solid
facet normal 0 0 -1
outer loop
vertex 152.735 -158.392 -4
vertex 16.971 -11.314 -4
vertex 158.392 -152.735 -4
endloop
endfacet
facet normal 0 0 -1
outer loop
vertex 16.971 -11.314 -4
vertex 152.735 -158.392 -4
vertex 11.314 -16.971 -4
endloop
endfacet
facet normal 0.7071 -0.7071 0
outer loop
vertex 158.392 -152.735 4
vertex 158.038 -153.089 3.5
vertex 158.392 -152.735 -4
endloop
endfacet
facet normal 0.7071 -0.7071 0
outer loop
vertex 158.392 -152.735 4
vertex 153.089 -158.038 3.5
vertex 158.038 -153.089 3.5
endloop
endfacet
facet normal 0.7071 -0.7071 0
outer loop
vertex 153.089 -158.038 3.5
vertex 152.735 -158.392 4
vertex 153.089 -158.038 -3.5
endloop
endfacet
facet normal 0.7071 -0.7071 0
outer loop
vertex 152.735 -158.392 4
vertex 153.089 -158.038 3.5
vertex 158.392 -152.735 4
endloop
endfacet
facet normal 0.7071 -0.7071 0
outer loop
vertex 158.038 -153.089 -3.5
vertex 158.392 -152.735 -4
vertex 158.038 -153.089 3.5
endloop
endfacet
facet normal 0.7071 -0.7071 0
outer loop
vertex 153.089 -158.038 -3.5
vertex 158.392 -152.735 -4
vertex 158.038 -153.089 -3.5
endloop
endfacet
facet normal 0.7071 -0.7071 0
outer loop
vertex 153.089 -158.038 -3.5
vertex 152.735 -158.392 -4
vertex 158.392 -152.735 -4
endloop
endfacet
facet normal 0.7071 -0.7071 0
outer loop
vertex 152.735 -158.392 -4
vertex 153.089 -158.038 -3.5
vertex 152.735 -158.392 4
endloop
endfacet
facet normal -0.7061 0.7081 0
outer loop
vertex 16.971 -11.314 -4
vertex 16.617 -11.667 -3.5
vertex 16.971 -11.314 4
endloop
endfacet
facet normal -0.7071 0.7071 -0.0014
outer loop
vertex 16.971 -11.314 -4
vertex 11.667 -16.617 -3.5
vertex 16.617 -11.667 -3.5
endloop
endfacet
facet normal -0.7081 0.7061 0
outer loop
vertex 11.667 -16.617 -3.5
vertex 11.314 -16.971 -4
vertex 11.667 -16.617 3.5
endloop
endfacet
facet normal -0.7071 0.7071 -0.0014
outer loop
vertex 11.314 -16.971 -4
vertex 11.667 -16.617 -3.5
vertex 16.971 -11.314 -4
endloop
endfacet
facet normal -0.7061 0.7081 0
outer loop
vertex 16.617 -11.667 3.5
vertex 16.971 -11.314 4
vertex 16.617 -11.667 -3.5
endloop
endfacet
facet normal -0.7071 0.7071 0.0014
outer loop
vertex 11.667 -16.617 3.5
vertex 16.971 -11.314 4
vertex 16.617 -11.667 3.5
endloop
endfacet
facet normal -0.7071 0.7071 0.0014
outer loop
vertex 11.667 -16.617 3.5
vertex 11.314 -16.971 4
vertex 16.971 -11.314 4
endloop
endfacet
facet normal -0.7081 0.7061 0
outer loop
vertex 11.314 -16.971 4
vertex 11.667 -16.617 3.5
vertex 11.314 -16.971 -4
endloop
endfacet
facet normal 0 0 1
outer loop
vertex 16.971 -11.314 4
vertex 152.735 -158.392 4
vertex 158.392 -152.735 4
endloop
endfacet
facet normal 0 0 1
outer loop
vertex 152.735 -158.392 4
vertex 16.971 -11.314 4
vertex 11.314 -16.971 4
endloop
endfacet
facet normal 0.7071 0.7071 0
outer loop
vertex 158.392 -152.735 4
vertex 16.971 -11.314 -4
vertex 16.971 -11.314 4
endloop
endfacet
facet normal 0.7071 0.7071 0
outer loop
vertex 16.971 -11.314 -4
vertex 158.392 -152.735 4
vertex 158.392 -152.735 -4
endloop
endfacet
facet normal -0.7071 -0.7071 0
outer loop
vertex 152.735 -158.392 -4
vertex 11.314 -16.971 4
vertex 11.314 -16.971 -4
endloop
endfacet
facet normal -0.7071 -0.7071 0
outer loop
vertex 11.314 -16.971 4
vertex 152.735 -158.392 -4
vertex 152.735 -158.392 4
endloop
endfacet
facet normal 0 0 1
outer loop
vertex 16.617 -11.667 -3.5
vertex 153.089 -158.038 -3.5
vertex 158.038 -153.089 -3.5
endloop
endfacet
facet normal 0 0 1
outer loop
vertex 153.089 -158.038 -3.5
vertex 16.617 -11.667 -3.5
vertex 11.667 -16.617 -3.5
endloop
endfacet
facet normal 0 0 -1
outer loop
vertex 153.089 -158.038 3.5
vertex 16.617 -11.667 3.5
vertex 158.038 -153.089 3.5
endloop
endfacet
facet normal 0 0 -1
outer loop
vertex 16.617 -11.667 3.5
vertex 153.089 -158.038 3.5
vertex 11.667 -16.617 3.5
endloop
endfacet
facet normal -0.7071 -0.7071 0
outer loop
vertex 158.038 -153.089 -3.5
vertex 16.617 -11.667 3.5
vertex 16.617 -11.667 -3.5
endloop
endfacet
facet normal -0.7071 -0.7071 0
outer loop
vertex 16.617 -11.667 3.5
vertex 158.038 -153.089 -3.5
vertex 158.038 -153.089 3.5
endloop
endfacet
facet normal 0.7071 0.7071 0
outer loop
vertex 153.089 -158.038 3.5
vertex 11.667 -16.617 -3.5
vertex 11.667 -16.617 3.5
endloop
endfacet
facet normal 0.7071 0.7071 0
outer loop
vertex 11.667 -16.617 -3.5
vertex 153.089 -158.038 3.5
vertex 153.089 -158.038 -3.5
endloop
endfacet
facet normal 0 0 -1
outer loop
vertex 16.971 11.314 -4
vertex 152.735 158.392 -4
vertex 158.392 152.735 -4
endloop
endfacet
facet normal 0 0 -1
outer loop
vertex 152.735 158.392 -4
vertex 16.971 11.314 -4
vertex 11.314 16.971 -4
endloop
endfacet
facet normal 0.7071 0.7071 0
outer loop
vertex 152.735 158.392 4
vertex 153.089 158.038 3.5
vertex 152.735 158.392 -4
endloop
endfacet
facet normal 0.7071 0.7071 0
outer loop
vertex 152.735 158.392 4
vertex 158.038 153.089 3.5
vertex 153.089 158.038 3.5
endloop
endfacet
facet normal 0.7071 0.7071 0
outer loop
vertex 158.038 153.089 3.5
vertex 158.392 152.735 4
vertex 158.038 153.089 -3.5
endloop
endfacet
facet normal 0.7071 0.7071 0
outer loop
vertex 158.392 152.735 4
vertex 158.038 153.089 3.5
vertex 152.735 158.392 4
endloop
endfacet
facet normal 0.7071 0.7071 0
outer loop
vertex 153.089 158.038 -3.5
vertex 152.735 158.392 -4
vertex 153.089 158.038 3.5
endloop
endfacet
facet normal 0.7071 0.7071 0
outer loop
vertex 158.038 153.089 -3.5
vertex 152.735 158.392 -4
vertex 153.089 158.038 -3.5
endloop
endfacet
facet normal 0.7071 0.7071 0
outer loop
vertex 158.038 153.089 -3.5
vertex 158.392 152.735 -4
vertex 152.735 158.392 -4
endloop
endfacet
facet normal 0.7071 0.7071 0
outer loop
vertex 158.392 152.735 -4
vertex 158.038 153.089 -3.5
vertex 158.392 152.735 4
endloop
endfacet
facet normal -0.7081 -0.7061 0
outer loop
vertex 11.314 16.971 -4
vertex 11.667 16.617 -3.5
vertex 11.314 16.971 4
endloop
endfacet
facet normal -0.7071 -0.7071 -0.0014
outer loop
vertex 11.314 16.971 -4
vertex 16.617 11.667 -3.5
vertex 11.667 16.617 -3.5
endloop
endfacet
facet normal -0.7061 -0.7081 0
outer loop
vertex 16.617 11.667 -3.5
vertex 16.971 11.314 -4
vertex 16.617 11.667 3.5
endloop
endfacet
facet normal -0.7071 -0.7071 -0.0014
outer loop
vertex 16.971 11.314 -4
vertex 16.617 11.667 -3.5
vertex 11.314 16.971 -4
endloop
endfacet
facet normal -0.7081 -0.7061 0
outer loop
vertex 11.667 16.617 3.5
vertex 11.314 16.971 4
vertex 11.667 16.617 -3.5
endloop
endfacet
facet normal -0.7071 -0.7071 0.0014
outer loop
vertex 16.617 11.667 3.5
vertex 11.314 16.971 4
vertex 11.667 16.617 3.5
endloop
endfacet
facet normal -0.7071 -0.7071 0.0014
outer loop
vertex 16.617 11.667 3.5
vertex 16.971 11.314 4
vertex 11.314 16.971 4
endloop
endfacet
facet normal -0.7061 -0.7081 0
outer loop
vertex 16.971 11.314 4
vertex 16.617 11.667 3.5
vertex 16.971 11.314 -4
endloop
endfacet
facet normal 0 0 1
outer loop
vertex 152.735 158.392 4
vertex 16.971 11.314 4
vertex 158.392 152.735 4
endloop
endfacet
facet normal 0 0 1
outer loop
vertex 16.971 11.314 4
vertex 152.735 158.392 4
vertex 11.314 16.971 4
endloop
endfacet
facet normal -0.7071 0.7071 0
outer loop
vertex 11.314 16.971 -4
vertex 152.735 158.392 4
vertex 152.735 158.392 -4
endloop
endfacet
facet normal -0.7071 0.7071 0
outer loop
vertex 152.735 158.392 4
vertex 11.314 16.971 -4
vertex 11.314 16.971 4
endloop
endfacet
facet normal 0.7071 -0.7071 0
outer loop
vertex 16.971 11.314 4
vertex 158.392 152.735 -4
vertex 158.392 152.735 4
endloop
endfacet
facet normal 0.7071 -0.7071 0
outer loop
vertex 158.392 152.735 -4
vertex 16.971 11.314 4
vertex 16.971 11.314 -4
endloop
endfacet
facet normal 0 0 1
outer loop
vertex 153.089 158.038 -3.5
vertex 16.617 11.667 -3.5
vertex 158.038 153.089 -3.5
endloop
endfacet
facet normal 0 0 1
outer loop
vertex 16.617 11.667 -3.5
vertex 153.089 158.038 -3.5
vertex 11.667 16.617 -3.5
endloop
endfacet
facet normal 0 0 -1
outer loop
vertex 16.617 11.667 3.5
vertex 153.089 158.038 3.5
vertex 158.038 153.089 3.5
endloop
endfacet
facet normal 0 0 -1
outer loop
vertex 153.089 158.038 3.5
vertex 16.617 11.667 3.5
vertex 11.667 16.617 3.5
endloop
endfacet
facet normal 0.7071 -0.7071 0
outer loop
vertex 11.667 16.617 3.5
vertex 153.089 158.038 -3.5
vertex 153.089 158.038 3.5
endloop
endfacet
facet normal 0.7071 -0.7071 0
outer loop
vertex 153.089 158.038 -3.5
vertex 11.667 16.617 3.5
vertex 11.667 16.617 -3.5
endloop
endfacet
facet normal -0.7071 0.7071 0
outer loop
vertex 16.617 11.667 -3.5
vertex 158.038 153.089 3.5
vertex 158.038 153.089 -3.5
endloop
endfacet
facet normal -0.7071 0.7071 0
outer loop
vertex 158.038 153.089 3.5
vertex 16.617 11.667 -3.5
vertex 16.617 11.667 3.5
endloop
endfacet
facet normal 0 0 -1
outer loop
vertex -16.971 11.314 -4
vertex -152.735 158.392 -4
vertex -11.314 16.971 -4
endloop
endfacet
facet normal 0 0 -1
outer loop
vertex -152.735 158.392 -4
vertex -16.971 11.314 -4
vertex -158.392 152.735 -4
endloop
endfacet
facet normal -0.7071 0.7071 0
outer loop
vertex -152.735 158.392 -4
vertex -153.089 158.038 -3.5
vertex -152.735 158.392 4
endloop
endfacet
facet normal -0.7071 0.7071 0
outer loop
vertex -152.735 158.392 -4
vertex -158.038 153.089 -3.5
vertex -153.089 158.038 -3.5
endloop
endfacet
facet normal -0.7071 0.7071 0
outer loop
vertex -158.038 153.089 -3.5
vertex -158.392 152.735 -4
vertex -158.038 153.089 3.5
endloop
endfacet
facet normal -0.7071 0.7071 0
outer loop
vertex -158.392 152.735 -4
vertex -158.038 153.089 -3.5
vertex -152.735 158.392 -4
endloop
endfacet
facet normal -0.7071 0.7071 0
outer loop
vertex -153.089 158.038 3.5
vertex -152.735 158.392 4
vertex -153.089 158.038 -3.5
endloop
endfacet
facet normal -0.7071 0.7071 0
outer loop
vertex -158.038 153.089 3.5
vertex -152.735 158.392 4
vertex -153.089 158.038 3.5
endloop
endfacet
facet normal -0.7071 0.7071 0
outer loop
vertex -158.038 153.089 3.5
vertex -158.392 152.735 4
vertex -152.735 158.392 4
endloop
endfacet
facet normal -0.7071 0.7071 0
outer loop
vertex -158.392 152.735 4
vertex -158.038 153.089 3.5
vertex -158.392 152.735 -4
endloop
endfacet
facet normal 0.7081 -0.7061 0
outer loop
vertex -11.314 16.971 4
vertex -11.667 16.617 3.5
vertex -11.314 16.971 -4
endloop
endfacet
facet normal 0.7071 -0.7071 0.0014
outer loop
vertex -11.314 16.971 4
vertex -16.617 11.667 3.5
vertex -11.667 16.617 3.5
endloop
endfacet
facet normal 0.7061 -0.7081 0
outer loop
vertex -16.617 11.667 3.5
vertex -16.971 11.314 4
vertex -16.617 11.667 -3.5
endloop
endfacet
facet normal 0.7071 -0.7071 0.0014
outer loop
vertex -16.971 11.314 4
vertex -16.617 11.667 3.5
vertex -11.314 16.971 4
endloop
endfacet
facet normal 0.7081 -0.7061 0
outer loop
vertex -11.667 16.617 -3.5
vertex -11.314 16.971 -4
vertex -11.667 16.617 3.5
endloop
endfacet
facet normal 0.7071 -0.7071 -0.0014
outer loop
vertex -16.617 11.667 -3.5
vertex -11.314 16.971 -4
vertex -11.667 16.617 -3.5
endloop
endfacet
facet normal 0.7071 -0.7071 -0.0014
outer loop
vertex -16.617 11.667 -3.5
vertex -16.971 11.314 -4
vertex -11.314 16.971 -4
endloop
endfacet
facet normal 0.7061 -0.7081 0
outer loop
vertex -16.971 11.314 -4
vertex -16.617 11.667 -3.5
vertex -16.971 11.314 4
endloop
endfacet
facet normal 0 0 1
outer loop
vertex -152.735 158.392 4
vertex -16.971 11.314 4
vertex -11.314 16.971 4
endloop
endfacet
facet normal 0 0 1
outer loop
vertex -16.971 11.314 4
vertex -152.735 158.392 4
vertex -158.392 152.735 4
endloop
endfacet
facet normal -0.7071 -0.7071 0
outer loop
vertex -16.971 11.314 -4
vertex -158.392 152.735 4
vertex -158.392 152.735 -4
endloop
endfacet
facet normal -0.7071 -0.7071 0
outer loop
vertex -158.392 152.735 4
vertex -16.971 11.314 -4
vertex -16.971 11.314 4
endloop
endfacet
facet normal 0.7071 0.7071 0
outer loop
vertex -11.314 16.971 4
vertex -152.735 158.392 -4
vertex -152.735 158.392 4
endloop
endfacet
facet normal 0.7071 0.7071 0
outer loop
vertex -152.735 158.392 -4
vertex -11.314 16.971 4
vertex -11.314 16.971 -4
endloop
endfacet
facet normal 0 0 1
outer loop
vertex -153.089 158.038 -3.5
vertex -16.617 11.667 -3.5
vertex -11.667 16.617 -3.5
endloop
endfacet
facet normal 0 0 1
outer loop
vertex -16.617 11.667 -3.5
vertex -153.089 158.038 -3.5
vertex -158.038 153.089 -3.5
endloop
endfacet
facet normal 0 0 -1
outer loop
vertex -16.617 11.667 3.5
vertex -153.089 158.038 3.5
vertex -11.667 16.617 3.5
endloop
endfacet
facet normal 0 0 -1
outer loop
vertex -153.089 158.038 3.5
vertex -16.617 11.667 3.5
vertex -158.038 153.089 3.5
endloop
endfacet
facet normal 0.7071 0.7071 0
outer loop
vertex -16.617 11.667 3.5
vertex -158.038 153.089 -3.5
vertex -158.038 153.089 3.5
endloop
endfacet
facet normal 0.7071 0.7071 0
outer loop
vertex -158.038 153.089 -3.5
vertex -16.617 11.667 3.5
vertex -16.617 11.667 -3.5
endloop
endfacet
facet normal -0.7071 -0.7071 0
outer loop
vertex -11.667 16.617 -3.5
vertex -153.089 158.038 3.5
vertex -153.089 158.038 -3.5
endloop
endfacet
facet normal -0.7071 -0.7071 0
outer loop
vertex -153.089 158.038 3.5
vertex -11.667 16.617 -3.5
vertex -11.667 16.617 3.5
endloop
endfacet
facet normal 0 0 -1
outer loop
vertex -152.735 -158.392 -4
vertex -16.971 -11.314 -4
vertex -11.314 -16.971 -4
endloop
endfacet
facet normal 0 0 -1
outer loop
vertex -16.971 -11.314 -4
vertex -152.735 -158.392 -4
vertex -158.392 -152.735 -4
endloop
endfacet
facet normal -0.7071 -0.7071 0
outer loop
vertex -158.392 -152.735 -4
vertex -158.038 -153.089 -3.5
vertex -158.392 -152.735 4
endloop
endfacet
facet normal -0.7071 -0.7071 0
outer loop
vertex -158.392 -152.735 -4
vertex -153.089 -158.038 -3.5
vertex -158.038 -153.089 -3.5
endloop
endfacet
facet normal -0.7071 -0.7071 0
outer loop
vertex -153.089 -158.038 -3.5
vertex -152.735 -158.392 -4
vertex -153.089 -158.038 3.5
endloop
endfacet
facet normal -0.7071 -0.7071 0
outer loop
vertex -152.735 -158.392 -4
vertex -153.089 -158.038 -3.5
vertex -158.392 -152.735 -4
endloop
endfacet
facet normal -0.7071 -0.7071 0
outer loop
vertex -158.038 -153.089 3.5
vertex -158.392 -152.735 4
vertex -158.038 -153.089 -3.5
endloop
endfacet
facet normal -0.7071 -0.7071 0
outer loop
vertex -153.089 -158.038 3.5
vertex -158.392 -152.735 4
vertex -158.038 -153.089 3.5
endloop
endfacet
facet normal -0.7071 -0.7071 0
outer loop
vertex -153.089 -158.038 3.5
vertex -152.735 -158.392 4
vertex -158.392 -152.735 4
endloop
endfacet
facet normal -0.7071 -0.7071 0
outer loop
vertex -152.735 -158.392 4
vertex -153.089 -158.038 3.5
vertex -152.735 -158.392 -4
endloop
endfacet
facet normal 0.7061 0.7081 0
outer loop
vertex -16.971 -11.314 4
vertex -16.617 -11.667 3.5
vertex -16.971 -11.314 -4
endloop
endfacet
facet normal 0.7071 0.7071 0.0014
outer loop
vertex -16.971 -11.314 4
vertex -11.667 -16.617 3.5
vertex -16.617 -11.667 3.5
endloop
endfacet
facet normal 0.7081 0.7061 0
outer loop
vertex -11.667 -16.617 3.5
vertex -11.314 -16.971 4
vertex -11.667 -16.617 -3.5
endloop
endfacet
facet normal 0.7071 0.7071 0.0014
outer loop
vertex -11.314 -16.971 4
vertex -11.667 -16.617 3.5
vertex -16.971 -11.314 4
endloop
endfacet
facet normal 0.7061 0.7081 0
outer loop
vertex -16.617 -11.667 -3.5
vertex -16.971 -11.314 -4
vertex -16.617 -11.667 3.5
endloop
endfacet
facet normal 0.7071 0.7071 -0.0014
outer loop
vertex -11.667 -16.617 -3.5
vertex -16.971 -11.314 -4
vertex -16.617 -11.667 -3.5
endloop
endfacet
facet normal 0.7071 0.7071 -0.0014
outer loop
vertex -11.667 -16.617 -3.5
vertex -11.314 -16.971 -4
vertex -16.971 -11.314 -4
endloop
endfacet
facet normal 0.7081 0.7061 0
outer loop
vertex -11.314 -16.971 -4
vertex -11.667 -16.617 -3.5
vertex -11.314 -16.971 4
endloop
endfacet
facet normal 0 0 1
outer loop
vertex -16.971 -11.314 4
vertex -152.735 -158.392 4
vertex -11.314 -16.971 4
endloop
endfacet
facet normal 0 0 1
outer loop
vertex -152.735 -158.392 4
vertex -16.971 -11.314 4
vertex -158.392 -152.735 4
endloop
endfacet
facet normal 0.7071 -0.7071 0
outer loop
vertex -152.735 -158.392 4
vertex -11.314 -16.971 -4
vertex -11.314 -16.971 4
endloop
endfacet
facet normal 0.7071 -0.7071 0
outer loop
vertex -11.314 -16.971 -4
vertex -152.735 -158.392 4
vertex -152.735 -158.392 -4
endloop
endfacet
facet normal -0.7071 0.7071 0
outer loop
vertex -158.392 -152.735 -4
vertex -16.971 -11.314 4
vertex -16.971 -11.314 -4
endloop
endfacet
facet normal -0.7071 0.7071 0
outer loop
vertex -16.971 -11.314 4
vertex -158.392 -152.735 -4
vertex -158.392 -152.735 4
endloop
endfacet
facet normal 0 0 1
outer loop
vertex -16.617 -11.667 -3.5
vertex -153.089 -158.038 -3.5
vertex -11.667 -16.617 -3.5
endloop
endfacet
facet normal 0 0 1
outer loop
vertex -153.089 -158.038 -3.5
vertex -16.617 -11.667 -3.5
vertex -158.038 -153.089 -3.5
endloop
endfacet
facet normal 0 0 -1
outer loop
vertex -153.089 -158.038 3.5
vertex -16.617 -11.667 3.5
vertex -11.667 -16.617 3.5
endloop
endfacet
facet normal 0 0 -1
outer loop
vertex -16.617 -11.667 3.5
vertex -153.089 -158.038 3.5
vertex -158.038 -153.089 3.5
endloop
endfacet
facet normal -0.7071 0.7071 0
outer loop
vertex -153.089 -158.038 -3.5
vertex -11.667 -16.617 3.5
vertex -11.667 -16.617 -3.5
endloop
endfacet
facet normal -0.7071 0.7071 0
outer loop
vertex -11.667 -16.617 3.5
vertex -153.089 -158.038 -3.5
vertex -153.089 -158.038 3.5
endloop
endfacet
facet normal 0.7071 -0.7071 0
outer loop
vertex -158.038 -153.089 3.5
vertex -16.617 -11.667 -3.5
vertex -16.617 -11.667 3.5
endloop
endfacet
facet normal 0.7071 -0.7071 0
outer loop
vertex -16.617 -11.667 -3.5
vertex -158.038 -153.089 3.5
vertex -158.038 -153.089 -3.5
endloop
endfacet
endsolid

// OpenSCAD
// file: arm.scad
module arm(width=8, height=8, length=200, thickness=1) {
  difference() {
    color("black")
    translate([0.0, 0.0, length / 2.0])
    cube([width, height, length],
         center=true);

    translate([0.0, 0.0, (length / 2.0) - 1.0])
    cube([width - thickness, height - thickness, length + 3.0],
         center=true);
  }
}

// arm(8, 8, 200, 1);
// main file
$fn = 40;
include <arm.scad>;

frame_thickness = 4;
frame_size = 210.0;

arm_length = frame_size / 2.0;
arm_width = 15.0;

body_width = 60;
body_depth= 60;

off_center = 20.0;
rotate([0.0, 90.0, -45.0]) translate([0.0, 0.0, off_center]) arm();
rotate([0.0, 90.0, 45.0]) translate([0.0, 0.0, off_center]) arm();
rotate([0.0, 90.0, 135.0]) translate([0.0, 0.0, off_center]) arm();
rotate([0.0, 90.0, 225.0]) translate([0.0, 0.0, off_center]) arm();
